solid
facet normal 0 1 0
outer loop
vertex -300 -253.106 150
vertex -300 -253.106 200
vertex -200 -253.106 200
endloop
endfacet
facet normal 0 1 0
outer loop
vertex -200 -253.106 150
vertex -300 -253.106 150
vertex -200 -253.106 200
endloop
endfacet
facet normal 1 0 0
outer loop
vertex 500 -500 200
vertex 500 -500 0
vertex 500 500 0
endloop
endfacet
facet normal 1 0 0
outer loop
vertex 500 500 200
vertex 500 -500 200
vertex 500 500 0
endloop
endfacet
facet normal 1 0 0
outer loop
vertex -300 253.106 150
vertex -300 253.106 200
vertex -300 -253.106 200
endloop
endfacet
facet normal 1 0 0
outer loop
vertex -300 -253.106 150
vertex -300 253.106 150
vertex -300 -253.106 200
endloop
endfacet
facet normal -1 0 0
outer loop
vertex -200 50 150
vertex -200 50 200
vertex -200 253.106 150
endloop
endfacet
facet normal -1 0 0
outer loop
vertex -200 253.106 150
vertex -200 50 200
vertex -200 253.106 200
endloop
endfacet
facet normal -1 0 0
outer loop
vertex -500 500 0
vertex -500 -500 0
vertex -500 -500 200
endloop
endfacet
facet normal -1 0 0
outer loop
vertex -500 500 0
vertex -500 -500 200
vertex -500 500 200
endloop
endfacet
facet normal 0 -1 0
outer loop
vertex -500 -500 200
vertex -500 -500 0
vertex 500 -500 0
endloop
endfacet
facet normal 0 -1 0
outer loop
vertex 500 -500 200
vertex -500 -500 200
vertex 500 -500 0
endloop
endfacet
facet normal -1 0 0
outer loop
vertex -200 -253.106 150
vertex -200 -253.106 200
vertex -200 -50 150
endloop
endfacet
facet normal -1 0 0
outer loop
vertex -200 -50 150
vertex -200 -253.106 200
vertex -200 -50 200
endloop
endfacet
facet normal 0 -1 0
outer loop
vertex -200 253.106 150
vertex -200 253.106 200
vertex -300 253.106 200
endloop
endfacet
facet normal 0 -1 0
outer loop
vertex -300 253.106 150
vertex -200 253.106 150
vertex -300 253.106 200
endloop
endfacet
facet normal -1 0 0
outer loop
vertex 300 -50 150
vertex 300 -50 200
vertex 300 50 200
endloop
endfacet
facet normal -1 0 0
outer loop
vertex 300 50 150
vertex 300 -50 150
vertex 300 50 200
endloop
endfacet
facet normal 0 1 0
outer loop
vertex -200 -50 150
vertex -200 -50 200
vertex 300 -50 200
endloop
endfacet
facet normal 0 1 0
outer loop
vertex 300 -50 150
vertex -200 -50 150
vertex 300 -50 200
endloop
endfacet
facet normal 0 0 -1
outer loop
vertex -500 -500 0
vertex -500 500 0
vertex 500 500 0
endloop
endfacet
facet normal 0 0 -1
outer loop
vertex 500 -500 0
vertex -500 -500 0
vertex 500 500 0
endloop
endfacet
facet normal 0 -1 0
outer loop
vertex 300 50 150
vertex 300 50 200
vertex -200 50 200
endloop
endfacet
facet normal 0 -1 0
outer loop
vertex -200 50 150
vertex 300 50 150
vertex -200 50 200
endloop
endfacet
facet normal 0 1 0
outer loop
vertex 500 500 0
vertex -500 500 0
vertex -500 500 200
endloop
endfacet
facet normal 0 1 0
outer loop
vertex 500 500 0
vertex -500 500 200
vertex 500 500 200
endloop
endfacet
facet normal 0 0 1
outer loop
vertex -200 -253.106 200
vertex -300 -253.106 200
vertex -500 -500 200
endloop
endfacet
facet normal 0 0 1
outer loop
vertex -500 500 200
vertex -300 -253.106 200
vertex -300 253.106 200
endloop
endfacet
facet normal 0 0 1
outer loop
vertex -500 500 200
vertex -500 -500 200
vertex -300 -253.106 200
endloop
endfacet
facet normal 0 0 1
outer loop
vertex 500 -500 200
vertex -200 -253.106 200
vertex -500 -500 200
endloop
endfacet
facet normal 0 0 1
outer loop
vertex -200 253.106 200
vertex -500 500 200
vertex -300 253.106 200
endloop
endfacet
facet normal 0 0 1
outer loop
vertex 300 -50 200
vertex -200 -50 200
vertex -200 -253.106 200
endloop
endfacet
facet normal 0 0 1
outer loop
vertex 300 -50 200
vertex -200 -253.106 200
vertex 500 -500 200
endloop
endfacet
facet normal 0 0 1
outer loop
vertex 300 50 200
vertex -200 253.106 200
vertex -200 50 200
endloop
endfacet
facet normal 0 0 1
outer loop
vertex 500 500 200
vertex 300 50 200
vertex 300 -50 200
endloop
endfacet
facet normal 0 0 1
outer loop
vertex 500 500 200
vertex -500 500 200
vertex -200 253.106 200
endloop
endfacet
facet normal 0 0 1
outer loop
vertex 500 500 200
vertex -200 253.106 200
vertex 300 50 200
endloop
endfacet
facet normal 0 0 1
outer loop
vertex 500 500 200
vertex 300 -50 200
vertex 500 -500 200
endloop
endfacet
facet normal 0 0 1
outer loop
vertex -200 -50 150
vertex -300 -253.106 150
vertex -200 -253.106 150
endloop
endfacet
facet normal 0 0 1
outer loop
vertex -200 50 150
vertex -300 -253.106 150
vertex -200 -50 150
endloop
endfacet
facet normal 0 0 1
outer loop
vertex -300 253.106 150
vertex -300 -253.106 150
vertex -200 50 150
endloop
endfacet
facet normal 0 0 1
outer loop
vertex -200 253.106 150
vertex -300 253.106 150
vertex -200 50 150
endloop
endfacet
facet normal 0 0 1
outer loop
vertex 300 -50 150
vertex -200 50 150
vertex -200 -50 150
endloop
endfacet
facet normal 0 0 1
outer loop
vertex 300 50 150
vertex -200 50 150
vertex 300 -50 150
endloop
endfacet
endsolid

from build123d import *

# Parameters (mm, degrees)
SKETCH_W     = 1000
SKETCH_H     = 1000
PAD_DEPTH    = 200
POCKET_DEPTH = 50


with BuildPart() as part:
    # Sketch → Pad (new body)
    with BuildSketch(Plane.XY):
        Rectangle(SKETCH_W, SKETCH_H)
    extrude(amount=PAD_DEPTH)

    # Sketch001 → Pocket (cut)
    with BuildSketch(Plane.XY.offset(200)):
        Polygon((-300, 253.105738), (-300, -253.105738), (-200, -253.105738), (-200, -50), (300, -50), (300, 50), (-200, 50), (-200, 253.105738), align=None)
    extrude(amount=-POCKET_DEPTH, mode=Mode.SUBTRACT)


solid = part.part
